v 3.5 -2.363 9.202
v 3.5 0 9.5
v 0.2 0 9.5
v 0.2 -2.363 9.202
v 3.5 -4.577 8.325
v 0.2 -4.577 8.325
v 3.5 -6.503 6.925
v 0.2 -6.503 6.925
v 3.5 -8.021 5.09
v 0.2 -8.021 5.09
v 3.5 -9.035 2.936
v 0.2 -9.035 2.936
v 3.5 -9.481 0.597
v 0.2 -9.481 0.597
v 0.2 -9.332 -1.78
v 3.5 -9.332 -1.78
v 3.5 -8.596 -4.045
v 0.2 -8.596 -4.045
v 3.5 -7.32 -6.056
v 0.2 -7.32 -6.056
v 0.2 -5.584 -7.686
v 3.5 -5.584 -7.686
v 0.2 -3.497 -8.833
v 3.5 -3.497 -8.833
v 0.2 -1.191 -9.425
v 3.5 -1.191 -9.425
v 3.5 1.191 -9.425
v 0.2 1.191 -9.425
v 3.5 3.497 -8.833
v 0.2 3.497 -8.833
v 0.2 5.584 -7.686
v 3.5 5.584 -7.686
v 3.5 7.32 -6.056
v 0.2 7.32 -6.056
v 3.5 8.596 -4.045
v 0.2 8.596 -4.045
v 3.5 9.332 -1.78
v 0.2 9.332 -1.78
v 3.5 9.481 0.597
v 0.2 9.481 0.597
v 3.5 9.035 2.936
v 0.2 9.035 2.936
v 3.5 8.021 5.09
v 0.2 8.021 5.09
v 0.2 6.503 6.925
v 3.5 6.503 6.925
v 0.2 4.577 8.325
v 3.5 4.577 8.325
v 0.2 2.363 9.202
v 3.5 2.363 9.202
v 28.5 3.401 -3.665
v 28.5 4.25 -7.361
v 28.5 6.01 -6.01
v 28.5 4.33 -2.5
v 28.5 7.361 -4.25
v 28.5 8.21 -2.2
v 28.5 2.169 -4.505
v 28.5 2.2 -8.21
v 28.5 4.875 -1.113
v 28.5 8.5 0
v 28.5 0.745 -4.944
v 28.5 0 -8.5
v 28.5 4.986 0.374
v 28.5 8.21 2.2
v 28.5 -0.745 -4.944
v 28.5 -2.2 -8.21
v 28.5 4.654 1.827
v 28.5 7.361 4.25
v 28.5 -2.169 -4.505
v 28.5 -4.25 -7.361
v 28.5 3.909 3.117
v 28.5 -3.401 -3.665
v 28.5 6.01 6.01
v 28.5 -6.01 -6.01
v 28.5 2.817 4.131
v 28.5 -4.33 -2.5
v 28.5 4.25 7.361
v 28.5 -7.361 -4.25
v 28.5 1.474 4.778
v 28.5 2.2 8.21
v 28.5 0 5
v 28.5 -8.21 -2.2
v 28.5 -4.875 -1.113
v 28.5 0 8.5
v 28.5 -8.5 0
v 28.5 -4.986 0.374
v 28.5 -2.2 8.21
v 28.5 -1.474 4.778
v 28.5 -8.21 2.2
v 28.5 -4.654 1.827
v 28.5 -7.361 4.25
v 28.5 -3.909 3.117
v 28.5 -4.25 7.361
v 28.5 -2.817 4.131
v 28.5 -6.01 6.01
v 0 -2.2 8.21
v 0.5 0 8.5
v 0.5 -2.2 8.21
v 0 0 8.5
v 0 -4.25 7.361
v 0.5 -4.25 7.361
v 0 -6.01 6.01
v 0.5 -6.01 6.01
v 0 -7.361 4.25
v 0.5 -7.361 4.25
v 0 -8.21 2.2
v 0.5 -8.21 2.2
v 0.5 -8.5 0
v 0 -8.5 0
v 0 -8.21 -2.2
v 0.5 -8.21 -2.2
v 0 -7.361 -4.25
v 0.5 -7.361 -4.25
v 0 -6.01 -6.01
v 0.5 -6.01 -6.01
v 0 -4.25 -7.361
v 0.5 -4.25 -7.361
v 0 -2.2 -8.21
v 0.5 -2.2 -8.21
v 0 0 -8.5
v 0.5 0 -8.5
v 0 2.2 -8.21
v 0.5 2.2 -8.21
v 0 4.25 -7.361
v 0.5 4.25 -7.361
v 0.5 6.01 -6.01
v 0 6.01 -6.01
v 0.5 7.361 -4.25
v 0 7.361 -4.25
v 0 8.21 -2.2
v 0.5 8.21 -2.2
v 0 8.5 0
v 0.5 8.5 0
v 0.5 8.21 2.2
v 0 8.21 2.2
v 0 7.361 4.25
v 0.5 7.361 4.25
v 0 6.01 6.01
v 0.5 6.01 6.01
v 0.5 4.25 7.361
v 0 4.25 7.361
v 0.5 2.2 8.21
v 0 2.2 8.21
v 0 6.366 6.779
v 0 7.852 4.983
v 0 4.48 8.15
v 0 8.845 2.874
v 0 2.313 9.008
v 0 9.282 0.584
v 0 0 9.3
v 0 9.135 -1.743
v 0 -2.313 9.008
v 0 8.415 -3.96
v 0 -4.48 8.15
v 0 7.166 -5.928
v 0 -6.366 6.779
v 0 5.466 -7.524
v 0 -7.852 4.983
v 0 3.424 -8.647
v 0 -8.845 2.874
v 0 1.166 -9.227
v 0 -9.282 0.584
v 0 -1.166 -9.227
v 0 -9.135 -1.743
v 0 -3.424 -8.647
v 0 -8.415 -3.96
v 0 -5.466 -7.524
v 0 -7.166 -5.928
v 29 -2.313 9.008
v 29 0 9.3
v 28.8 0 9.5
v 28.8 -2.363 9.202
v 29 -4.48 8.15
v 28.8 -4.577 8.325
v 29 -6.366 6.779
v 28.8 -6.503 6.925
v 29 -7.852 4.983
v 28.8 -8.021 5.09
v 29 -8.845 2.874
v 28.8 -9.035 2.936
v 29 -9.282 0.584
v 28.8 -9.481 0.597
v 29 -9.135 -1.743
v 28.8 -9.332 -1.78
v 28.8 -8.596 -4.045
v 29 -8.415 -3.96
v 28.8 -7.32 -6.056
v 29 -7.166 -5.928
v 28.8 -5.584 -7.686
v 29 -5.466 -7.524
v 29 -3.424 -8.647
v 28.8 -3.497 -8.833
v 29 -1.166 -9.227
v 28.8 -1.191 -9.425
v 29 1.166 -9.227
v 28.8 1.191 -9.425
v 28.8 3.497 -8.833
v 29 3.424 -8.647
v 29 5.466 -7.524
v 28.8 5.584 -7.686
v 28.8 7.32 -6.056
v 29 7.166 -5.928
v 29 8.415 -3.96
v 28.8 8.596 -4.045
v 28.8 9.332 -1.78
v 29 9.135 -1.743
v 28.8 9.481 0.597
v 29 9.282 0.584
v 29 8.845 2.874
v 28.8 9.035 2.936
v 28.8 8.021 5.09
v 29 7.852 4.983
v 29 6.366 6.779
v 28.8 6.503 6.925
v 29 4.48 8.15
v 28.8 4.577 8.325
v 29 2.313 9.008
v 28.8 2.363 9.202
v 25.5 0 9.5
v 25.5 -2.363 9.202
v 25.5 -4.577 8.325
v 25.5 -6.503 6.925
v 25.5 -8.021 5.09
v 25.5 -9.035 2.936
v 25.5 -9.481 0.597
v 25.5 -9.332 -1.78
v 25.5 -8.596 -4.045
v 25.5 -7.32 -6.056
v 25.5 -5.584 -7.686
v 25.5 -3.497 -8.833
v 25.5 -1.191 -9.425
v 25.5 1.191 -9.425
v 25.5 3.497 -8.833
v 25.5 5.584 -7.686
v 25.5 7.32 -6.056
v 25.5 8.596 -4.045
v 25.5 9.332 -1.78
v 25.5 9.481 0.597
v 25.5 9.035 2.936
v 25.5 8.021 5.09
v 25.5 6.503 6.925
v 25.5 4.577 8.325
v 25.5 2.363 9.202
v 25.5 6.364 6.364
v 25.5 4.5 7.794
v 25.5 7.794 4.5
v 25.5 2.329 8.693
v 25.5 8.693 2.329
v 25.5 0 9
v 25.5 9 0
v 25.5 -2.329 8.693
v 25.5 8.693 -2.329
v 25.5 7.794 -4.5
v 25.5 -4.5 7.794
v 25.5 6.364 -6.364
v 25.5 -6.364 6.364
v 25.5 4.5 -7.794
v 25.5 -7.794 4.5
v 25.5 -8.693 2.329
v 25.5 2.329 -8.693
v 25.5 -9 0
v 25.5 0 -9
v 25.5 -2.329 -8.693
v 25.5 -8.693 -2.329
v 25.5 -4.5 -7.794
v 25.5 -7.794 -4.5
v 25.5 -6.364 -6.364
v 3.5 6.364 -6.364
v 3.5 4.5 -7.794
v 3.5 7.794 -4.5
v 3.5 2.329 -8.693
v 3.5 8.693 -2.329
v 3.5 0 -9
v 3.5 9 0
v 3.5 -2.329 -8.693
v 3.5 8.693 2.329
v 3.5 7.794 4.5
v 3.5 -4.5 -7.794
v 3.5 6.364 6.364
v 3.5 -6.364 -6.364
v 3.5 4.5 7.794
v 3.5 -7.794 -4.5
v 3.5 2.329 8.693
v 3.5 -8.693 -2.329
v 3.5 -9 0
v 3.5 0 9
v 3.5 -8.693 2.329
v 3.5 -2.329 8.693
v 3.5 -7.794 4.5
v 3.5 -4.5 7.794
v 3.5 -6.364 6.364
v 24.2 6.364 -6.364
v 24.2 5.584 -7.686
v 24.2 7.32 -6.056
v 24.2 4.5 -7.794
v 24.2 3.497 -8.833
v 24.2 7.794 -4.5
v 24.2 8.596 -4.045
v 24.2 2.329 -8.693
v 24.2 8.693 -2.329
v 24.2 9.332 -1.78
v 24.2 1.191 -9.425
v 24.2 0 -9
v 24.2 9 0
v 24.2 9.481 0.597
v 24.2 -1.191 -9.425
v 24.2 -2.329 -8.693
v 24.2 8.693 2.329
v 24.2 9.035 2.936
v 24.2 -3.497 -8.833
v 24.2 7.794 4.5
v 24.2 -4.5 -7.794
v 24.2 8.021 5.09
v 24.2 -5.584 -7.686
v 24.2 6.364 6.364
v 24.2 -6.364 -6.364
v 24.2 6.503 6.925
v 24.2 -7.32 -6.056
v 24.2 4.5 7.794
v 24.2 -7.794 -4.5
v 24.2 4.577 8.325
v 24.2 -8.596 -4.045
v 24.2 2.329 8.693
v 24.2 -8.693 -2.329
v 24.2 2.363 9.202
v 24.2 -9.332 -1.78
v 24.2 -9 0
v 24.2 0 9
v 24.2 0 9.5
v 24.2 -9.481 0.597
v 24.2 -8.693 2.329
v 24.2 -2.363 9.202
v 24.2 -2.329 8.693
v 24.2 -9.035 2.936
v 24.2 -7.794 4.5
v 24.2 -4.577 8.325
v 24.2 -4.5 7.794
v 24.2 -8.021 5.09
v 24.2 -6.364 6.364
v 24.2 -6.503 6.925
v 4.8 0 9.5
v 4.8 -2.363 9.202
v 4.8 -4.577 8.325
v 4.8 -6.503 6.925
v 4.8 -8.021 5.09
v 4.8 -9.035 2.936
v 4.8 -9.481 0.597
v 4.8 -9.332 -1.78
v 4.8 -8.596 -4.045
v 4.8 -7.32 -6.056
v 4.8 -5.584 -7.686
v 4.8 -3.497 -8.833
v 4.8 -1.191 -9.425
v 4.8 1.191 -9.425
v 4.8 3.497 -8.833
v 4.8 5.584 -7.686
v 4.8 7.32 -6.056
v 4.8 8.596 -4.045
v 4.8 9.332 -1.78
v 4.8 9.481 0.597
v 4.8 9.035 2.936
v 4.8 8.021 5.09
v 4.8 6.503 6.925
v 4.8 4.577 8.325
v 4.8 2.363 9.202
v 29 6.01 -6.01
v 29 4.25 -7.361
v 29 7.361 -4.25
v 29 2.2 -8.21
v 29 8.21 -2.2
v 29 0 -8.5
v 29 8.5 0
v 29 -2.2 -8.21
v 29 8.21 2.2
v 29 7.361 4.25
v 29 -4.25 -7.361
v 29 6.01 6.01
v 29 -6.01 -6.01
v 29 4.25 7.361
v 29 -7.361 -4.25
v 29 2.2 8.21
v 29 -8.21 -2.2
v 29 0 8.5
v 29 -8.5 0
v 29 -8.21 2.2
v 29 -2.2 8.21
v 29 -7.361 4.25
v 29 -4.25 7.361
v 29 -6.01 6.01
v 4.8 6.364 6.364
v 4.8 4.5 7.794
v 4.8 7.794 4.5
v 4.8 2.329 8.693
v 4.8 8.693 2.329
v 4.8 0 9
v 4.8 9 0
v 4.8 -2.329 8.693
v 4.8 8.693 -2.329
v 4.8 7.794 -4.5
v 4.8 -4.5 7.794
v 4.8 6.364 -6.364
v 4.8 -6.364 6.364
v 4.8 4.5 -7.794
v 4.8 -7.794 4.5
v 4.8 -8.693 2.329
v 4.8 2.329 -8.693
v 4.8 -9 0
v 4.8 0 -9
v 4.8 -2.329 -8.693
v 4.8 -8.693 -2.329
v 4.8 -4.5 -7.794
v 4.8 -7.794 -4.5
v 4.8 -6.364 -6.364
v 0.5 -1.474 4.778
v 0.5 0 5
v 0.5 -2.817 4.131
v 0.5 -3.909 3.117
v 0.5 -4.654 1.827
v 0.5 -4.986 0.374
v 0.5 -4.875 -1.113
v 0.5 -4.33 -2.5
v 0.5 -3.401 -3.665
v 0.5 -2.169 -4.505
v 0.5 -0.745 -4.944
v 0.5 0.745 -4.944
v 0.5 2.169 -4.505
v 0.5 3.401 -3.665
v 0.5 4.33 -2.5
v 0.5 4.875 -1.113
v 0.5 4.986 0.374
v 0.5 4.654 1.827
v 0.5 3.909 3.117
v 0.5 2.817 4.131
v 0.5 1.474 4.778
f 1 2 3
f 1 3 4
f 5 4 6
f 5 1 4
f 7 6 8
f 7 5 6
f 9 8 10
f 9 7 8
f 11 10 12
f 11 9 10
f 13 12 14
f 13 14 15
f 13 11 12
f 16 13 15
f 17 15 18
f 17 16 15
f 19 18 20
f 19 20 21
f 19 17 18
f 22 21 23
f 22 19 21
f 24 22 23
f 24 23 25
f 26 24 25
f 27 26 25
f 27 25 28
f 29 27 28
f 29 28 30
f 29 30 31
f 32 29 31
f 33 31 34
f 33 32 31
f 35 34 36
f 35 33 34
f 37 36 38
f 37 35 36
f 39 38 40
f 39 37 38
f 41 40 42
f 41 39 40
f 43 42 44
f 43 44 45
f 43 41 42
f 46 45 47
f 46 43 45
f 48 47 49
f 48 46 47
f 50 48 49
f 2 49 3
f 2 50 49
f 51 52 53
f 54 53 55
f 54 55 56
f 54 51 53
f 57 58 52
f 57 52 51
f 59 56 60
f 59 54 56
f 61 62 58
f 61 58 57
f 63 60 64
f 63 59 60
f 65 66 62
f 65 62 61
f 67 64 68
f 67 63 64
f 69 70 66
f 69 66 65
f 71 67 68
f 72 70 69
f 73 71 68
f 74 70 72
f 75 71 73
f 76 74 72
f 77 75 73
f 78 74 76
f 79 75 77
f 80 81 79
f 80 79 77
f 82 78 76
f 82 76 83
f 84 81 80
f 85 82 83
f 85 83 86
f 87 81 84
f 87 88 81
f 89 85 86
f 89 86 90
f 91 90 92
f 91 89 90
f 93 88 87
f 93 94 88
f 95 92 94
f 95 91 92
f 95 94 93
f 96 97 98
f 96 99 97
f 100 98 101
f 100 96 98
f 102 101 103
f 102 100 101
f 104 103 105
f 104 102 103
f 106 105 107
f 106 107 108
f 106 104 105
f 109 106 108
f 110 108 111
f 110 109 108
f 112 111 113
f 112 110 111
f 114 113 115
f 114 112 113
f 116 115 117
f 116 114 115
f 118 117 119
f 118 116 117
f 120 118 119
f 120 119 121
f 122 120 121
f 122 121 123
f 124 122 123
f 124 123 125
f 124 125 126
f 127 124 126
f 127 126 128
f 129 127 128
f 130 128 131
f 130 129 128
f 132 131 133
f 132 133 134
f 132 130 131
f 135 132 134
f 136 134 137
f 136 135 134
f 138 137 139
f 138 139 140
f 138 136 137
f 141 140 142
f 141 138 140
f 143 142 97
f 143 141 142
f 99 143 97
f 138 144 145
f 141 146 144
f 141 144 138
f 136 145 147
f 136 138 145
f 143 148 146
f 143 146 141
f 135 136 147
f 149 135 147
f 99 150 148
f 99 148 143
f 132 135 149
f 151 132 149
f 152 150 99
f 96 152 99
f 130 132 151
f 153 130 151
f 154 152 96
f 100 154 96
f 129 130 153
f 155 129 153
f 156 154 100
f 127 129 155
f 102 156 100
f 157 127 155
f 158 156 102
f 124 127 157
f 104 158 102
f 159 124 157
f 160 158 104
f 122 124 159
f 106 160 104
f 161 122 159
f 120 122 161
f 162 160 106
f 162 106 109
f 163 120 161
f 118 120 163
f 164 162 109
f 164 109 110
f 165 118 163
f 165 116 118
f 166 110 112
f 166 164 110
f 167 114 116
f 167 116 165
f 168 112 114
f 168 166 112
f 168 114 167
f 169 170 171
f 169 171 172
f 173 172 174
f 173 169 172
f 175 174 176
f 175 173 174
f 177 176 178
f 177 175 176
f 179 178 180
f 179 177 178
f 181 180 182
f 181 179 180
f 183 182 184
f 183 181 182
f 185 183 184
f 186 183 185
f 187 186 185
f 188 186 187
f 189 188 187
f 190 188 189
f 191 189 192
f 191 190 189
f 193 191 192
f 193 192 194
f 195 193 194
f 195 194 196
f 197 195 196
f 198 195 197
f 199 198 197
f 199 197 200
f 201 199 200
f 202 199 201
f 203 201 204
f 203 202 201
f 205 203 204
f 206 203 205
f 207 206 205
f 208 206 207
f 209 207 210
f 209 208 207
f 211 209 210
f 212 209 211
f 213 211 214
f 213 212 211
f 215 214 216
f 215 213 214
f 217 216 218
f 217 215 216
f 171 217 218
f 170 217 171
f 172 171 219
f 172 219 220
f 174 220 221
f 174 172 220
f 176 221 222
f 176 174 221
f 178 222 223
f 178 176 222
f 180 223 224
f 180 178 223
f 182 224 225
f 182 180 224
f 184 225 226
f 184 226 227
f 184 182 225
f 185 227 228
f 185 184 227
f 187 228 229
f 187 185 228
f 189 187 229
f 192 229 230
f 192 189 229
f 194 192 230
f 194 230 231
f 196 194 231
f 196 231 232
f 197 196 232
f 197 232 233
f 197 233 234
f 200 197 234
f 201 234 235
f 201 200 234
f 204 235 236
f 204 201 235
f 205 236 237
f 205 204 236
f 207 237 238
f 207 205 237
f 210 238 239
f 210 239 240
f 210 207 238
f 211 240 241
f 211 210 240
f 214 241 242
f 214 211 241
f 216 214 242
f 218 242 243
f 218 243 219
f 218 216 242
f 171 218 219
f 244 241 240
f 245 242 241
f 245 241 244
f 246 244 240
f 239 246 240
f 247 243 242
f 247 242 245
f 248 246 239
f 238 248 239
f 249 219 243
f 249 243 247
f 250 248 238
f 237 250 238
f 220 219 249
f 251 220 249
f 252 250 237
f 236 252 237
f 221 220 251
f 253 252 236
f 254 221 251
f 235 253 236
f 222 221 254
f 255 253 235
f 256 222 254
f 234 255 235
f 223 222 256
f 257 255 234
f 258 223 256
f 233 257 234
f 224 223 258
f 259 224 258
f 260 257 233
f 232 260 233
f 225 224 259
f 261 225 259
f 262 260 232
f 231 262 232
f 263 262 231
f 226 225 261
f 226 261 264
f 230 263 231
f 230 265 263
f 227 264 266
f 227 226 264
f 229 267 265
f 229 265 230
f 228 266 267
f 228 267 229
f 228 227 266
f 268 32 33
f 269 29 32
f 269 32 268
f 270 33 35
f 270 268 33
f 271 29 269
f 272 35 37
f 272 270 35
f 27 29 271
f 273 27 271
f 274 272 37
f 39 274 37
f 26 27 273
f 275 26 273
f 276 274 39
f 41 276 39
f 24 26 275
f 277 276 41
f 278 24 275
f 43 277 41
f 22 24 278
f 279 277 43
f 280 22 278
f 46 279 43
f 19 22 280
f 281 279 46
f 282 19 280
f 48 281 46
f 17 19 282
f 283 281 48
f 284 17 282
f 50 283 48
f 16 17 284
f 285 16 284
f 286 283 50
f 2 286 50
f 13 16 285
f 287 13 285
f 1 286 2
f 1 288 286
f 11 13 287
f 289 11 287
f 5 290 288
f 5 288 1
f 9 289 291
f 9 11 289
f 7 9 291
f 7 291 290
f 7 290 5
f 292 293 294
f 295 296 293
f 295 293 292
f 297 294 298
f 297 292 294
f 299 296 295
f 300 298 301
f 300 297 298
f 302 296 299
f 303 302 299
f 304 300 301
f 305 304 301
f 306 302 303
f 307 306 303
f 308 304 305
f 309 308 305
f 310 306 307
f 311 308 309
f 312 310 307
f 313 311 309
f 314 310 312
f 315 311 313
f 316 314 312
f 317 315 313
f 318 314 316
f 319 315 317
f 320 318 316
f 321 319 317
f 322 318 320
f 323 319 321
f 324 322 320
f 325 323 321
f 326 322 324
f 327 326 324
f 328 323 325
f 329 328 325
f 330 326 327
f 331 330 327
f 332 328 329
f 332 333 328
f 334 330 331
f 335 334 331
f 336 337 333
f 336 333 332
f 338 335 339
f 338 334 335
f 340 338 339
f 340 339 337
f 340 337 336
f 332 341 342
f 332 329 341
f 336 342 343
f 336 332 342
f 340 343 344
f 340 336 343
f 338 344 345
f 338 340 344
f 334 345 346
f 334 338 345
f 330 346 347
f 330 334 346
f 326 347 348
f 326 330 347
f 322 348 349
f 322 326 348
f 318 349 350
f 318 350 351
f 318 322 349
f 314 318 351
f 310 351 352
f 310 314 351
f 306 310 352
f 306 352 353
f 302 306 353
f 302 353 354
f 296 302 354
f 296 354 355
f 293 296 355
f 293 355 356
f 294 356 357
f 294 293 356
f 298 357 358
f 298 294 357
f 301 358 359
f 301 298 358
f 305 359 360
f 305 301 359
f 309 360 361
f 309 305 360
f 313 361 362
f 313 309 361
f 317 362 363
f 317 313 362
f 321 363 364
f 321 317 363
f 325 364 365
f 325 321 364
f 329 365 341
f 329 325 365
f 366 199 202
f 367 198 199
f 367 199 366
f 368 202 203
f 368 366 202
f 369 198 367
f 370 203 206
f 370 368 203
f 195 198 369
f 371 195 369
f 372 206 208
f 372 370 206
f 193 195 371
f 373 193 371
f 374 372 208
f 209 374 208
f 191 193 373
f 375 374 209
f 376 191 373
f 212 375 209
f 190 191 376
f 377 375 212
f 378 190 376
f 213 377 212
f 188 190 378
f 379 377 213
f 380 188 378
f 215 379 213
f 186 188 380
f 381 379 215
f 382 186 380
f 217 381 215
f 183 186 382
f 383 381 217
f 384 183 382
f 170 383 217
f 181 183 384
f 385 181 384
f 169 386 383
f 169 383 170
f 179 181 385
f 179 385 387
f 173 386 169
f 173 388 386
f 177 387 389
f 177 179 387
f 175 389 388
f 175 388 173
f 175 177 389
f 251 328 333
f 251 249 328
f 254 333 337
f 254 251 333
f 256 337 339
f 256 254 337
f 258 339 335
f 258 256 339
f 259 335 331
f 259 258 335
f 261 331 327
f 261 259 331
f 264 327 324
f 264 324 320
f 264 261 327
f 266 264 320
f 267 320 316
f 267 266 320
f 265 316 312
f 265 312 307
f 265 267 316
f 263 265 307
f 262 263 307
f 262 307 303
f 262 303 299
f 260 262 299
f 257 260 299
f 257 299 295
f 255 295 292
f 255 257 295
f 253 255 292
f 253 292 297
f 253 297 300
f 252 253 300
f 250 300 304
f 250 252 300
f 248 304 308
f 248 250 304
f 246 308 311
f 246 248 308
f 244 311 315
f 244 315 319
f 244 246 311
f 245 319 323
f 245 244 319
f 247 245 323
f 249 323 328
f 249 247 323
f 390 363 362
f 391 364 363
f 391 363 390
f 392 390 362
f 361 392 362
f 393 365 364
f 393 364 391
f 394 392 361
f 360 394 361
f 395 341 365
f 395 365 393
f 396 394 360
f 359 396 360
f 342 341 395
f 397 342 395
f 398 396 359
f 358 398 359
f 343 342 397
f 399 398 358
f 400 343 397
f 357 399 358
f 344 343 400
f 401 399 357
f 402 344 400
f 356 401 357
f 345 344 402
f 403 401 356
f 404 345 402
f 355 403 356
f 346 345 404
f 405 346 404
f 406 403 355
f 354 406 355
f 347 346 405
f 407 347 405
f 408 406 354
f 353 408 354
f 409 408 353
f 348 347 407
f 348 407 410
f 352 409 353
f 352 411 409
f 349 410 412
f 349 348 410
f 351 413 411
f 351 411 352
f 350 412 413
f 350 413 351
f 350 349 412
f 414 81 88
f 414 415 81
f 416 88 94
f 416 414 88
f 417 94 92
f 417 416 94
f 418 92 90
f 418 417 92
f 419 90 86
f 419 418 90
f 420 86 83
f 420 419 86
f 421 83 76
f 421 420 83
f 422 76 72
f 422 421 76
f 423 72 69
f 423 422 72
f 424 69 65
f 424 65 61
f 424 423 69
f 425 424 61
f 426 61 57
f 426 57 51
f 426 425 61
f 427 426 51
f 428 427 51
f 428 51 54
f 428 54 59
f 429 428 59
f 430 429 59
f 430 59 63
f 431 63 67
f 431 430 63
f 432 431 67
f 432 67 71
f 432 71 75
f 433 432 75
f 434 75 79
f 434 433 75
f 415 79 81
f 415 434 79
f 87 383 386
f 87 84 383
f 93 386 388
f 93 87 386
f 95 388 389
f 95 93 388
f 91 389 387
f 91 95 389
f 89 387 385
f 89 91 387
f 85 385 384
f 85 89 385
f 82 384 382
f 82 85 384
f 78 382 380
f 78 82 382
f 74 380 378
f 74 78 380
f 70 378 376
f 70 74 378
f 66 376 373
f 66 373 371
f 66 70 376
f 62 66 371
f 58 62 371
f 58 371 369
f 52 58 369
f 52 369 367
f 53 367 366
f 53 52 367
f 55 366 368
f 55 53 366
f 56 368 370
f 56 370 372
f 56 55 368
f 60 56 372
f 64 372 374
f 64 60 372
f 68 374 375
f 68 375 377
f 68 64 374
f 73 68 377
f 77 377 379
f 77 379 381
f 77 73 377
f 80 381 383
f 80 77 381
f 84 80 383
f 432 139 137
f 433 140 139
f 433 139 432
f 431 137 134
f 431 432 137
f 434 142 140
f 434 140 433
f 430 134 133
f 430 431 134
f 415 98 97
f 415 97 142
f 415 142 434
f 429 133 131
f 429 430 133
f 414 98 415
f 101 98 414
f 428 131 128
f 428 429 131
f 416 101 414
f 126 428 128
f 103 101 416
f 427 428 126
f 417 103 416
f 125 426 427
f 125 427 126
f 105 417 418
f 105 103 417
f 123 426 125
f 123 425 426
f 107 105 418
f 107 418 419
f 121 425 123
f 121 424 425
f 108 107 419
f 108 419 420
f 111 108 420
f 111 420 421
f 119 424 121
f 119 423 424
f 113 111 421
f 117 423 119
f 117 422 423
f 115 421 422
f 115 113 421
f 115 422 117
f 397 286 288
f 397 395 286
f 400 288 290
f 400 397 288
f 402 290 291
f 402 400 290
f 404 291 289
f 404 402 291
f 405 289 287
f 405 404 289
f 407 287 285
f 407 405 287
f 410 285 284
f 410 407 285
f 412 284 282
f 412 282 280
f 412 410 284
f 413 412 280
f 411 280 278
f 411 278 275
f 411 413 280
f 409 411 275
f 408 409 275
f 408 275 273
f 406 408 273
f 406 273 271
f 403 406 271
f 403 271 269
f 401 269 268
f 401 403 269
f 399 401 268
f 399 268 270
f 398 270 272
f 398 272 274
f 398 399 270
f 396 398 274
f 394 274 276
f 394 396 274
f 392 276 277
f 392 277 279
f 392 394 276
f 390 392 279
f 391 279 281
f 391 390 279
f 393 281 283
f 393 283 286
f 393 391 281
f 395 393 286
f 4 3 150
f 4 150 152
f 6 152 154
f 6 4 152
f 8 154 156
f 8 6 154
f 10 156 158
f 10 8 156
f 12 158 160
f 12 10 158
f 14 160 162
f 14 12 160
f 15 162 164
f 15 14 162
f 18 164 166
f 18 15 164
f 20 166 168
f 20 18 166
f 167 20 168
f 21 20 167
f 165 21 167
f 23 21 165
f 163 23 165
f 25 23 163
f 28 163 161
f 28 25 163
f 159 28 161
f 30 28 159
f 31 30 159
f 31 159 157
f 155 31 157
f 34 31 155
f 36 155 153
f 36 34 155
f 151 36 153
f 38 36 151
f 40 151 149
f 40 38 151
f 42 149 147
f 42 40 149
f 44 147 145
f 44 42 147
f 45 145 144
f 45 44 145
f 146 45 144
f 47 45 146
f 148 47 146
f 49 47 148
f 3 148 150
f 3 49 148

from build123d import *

# Parameters (mm, degrees)
CHAMFER1_SIZE = 0.2


with BuildPart() as part:
    # Sketch1 → Revolve1 (revolve)
    with BuildSketch(Plane.XY, mode=Mode.PRIVATE) as revolve1_sk:
        Polygon((0.5, 5), (0.5, 8.5), (0, 8.5), (0, 9.5), (3.5, 9.5), (3.5, 9), (4.8, 9), (4.8, 9.5), (24.2, 9.5), (24.2, 9), (25.5, 9), (25.5, 9.5), (29, 9.5), (29, 8.5), (28.5, 8.5), (28.5, 5), align=None)
    revolve(revolve1_sk.sketch.rotate(Axis((0, 0, 0), (1, 0, 0)), 90), axis=Axis((0, 0, 0), (1, 0, 0)))

    # Chamfer1
    chamfer1_edges = [part.edges().sort_by_distance(p)[0] for p in [
        (29, 0, -9.5),
        (0, 0, -9.5),
    ]]
    chamfer(chamfer1_edges, length=CHAMFER1_SIZE)


solid = part.part
